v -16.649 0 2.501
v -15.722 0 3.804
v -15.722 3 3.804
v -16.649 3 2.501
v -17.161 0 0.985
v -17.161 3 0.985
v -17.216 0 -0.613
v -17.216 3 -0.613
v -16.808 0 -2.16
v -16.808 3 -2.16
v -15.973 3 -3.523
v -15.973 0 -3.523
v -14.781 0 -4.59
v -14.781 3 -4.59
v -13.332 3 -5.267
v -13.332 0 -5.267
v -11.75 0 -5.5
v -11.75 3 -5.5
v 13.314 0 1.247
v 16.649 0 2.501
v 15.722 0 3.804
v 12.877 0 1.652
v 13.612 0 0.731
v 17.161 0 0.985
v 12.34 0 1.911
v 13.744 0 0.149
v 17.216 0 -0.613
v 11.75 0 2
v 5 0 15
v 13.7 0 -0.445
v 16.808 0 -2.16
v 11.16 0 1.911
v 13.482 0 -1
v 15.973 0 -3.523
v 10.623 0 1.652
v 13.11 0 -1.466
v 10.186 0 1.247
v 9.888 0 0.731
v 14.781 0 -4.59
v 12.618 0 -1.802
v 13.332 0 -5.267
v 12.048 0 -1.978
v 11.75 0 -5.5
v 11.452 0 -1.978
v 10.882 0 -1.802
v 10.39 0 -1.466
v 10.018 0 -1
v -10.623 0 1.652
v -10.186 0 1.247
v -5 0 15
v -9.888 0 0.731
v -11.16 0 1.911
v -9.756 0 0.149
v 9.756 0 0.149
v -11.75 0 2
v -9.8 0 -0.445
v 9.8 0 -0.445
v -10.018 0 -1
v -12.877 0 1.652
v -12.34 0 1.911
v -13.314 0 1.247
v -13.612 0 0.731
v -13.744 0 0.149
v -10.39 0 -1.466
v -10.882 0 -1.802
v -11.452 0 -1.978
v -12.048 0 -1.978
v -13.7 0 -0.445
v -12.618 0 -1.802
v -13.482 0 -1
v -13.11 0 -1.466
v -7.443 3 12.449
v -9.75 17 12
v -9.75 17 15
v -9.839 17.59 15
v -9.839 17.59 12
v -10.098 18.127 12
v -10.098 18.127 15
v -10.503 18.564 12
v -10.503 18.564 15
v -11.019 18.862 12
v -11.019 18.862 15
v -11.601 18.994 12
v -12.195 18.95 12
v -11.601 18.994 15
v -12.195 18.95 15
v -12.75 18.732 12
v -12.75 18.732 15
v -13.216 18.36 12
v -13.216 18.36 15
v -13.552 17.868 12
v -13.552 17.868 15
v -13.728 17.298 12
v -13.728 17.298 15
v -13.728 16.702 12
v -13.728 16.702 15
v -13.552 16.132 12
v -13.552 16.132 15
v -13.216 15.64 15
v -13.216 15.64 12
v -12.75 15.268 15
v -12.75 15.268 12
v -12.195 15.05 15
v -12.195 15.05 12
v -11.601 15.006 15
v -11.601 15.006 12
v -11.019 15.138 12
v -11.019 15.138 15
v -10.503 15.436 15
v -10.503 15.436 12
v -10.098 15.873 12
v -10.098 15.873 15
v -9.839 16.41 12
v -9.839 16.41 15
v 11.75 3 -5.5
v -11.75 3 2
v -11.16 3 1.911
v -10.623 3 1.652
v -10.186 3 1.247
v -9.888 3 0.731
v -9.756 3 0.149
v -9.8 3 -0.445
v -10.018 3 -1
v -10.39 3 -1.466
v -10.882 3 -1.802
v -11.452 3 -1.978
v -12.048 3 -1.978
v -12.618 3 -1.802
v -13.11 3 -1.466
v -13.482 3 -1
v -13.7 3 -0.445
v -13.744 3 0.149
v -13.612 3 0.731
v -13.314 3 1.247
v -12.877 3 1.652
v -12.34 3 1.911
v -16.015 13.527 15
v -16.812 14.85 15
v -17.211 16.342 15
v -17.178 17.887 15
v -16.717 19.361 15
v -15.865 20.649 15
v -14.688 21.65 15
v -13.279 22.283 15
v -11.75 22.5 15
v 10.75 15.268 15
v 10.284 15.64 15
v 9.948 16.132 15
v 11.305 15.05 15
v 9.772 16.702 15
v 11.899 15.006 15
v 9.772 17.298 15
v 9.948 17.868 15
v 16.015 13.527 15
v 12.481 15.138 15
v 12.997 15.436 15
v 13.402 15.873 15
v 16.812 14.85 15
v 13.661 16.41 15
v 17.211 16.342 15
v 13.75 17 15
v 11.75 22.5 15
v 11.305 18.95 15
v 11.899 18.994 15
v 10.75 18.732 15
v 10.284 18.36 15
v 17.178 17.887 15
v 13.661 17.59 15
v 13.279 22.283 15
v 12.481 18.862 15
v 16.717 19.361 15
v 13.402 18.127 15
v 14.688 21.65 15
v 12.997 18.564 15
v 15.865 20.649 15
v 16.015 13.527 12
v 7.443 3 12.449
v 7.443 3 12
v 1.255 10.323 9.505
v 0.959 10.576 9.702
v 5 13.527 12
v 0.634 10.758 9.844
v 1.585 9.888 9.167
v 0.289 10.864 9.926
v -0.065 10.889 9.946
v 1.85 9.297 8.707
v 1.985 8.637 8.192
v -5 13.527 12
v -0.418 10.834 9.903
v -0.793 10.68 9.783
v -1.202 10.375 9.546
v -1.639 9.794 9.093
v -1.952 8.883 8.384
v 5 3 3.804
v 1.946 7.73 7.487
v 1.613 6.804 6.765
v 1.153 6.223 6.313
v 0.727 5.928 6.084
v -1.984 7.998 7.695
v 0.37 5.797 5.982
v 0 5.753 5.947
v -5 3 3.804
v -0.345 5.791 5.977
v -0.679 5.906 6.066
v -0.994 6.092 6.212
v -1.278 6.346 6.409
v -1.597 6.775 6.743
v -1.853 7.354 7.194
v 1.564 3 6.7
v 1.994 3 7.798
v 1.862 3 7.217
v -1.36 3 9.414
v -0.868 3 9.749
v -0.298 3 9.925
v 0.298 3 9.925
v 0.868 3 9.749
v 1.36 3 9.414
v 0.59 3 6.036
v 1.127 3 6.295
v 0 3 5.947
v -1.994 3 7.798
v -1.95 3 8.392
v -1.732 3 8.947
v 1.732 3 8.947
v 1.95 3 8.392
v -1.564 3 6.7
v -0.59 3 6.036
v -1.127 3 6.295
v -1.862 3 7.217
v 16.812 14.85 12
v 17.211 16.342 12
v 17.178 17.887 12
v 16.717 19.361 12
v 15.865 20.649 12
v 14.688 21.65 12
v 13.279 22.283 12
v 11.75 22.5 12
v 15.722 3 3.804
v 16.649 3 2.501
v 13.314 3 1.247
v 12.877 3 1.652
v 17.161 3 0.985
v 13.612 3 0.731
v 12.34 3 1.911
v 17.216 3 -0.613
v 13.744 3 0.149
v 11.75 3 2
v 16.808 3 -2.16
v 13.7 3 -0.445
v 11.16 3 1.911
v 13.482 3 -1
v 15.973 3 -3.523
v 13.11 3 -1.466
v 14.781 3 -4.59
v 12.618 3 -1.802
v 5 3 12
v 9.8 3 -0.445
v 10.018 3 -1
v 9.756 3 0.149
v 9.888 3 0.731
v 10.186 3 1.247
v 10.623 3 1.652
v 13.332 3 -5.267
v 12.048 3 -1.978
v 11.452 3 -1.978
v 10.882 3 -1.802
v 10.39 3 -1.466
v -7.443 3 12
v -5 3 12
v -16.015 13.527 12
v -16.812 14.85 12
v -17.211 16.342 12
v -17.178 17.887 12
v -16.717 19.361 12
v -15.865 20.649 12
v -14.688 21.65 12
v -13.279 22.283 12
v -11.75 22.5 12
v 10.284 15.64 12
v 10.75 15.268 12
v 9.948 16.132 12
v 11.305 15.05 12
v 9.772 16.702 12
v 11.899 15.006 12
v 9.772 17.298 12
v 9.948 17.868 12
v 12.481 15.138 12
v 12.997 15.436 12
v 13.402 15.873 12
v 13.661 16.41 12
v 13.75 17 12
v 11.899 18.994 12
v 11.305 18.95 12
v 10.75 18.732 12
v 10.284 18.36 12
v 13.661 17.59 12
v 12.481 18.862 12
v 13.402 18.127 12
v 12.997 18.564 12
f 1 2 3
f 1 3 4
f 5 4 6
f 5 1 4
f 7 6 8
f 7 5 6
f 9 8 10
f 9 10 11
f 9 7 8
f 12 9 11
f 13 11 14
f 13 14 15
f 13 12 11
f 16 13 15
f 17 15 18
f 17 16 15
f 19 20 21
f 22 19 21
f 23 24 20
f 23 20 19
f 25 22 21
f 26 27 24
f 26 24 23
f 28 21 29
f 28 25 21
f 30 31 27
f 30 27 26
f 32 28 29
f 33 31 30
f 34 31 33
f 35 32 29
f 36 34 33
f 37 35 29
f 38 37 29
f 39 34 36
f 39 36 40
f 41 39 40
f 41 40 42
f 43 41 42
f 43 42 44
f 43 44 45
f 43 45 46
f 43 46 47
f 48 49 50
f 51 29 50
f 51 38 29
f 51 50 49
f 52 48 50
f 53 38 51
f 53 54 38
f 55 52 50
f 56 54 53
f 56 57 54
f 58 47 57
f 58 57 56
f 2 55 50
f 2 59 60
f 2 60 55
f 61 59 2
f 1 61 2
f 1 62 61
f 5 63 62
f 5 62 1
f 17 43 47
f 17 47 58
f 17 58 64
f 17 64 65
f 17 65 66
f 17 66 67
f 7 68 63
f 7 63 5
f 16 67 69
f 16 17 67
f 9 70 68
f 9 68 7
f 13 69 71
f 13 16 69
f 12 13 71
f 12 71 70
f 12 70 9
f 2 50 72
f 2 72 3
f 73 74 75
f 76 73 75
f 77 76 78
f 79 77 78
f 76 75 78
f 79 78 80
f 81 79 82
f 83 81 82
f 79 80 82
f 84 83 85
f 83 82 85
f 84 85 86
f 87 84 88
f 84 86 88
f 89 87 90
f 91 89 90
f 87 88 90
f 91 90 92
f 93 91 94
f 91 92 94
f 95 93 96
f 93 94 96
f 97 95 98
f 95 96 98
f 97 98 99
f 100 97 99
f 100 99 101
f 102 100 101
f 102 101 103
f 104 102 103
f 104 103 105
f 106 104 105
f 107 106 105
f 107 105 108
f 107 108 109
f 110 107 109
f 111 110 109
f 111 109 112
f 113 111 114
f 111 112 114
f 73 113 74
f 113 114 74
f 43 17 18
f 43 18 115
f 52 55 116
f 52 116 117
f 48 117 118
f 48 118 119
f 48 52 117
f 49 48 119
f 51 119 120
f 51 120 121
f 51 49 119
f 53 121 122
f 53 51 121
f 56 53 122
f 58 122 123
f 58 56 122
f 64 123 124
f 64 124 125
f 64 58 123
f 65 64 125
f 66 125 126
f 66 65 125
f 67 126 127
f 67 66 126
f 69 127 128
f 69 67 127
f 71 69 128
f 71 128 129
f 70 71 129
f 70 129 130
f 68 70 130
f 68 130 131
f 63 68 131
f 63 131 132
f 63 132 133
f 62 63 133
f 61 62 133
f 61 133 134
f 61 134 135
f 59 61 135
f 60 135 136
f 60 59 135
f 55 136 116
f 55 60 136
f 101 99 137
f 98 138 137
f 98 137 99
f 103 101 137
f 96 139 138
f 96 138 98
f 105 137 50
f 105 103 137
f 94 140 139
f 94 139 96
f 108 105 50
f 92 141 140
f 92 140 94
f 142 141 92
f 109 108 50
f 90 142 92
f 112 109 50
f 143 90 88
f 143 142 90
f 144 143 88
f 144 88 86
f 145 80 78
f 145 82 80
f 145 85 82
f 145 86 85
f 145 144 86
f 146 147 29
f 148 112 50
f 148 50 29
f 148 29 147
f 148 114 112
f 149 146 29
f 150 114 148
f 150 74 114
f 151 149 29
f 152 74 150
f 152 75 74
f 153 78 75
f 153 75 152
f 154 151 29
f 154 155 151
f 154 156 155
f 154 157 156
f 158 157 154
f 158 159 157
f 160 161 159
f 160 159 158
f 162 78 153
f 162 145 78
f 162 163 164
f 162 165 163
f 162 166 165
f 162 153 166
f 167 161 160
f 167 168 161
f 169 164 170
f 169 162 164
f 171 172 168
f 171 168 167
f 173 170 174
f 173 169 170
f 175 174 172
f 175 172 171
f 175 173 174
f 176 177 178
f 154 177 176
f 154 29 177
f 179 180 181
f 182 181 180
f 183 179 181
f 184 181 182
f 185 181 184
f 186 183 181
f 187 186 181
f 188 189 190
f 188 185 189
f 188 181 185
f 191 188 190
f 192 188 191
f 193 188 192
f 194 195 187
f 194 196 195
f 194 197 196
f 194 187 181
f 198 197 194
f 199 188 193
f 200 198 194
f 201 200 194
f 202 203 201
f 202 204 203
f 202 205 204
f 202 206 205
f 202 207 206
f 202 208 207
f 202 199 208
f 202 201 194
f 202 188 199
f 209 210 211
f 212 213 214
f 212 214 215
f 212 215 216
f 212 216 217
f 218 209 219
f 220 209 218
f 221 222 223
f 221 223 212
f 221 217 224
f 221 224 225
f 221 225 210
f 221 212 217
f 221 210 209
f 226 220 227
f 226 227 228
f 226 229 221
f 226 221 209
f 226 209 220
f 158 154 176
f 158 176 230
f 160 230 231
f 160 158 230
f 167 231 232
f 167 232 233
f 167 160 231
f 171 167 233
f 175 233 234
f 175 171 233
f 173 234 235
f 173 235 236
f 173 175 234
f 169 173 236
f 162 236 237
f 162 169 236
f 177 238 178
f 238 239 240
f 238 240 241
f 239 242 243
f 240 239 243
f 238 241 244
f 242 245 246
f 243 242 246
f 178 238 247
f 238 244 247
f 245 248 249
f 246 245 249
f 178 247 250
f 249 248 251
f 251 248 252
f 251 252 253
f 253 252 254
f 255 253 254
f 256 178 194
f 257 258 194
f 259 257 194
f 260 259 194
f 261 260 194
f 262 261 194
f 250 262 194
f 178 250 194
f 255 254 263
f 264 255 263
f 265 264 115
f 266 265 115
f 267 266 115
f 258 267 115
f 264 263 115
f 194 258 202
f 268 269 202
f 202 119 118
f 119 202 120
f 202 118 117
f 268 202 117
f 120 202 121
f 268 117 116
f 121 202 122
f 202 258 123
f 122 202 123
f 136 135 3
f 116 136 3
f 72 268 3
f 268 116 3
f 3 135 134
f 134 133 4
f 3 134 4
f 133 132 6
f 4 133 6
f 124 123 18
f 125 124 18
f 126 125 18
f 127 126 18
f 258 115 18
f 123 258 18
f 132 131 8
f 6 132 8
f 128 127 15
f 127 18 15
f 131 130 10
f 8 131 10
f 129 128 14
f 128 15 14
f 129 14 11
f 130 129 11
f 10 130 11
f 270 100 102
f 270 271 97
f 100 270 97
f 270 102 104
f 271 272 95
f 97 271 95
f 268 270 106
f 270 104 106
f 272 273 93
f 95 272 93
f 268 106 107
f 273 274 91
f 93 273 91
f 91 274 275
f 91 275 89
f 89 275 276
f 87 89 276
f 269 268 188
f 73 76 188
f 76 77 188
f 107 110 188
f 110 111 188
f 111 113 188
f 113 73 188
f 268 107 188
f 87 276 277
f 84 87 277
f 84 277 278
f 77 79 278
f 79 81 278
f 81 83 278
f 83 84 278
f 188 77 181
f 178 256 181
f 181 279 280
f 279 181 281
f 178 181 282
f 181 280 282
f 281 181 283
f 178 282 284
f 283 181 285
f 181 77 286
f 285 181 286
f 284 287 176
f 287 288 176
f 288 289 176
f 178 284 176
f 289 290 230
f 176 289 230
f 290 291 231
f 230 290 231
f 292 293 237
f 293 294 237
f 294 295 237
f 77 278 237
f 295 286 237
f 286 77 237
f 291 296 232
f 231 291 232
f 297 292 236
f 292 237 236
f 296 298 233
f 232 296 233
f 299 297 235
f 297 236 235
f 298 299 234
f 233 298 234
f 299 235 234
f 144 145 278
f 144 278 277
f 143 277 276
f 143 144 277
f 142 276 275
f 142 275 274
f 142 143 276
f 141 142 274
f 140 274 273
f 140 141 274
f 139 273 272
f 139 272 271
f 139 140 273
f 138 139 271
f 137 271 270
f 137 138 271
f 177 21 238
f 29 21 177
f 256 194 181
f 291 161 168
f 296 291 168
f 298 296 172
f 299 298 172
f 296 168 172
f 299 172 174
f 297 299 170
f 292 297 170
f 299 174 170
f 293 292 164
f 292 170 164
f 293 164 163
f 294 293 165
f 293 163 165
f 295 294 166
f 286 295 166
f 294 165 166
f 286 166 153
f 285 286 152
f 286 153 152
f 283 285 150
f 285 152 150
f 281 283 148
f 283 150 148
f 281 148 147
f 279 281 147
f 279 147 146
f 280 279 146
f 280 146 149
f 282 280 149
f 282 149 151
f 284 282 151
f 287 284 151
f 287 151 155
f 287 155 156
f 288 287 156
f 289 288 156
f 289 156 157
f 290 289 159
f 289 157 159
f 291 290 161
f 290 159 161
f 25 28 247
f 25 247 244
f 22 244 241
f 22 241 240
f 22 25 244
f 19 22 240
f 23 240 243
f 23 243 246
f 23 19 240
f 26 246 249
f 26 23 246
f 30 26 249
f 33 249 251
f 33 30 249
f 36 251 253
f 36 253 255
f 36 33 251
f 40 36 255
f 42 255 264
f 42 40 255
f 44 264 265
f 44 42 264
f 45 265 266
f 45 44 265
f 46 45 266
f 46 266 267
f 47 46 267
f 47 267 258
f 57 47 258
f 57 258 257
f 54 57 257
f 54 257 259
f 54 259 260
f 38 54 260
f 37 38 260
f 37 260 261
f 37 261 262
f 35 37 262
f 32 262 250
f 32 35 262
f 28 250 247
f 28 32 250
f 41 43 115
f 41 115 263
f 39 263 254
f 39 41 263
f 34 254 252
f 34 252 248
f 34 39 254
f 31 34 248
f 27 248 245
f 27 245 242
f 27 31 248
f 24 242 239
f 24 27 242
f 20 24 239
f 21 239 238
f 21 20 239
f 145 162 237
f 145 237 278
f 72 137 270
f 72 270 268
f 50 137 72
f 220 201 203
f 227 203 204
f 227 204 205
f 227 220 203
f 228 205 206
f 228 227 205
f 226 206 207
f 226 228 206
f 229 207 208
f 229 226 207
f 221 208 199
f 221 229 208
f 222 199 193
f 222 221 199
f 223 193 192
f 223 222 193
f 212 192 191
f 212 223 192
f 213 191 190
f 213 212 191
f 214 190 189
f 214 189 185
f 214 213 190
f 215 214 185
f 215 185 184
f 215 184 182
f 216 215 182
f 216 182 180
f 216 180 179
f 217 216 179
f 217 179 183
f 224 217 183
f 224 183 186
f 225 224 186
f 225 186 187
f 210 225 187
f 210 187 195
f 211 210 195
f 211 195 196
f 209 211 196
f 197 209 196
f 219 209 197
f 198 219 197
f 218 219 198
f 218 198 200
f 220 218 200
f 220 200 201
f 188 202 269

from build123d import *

# Parameters (mm, degrees)
SKETCH_1_R           = 2
EXTRUDE_1_DEPTH      = 3
SKETCH_2_R           = 2
EXTRUDE_2_DEPTH      = 3
EXTRUDE_3_DEPTH      = 5
EXTRUDE_3_DEPTH_BACK = 5
SKETCH_4_R           = 2
CUT_EXTRUDE_1_DEPTH  = 31.046838436


with BuildPart() as part:
    # 草图1 → 凸台-拉伸1 (new body)
    with BuildSketch(Plane(origin=(0, 0, 0), x_dir=(1, 0, 0), z_dir=(0, 1, 0))):
        with BuildLine():
            Line((-11.75, 5.5), (11.75, 5.5))
            ThreePointArc((11.75, 5.5), (16.808303364, 2.159529364), (15.72220169, -3.804157427))
            Line((15.72220169, -3.804157427), (5, -15))
            Line((5, -15), (-5, -15))
            Line((-5, -15), (-15.72220169, -3.804157427))
            ThreePointArc((-15.72220169, -3.804157427), (-16.808303364, 2.159529364), (-11.75, 5.5))
        make_face()
        with Locations((-11.75, 0)):
            Circle(SKETCH_1_R, mode=Mode.SUBTRACT)
        with Locations((11.75, 0)):
            Circle(SKETCH_1_R, mode=Mode.SUBTRACT)
    extrude(amount=EXTRUDE_1_DEPTH)

    # 草图2 → 凸台-拉伸2 (add)
    with BuildSketch(Plane.XY.offset(15)):
        with BuildLine():
            Line((11.75, 22.5), (-11.75, 22.5))
            ThreePointArc((-11.75, 22.5), (-16.717422464, 19.361083239), (-16.014908335, 13.527168749))
            Line((-16.014908335, 13.527168749), (-5, 0))
            Line((-5, 0), (5, 0))
            Line((5, 0), (16.014908335, 13.527168749))
            ThreePointArc((16.014908335, 13.527168749), (16.717422464, 19.361083239), (11.75, 22.5))
        make_face()
        with Locations((11.75, 17)):
            Circle(SKETCH_2_R, mode=Mode.SUBTRACT)
        with Locations((-11.75, 17)):
            Circle(SKETCH_2_R, mode=Mode.SUBTRACT)
    extrude(amount=-EXTRUDE_2_DEPTH)

    # 草图3 → 凸台-拉伸3 (add, two sides: drawn at the far end of the back side and taken through both)
    with BuildSketch(Plane(origin=(0, 0, 0), x_dir=(0, 0, -1), z_dir=(1, 0, 0)).offset(-EXTRUDE_3_DEPTH_BACK)):
        Polygon((-12, 13.527168749), (-3.804157427, 3), (-12, 3), align=None)
    extrude(amount=EXTRUDE_3_DEPTH + EXTRUDE_3_DEPTH_BACK)

    # 草图4 → 切除-拉伸1 (cut, through all)
    with BuildSketch(Plane(origin=(0, 3, 0), x_dir=(1, 0, 0), z_dir=(0, 1, 0))):
        with Locations((0, -7.947430558)):
            Circle(SKETCH_4_R)
    extrude(amount=CUT_EXTRUDE_1_DEPTH, mode=Mode.SUBTRACT)


solid = part.part
